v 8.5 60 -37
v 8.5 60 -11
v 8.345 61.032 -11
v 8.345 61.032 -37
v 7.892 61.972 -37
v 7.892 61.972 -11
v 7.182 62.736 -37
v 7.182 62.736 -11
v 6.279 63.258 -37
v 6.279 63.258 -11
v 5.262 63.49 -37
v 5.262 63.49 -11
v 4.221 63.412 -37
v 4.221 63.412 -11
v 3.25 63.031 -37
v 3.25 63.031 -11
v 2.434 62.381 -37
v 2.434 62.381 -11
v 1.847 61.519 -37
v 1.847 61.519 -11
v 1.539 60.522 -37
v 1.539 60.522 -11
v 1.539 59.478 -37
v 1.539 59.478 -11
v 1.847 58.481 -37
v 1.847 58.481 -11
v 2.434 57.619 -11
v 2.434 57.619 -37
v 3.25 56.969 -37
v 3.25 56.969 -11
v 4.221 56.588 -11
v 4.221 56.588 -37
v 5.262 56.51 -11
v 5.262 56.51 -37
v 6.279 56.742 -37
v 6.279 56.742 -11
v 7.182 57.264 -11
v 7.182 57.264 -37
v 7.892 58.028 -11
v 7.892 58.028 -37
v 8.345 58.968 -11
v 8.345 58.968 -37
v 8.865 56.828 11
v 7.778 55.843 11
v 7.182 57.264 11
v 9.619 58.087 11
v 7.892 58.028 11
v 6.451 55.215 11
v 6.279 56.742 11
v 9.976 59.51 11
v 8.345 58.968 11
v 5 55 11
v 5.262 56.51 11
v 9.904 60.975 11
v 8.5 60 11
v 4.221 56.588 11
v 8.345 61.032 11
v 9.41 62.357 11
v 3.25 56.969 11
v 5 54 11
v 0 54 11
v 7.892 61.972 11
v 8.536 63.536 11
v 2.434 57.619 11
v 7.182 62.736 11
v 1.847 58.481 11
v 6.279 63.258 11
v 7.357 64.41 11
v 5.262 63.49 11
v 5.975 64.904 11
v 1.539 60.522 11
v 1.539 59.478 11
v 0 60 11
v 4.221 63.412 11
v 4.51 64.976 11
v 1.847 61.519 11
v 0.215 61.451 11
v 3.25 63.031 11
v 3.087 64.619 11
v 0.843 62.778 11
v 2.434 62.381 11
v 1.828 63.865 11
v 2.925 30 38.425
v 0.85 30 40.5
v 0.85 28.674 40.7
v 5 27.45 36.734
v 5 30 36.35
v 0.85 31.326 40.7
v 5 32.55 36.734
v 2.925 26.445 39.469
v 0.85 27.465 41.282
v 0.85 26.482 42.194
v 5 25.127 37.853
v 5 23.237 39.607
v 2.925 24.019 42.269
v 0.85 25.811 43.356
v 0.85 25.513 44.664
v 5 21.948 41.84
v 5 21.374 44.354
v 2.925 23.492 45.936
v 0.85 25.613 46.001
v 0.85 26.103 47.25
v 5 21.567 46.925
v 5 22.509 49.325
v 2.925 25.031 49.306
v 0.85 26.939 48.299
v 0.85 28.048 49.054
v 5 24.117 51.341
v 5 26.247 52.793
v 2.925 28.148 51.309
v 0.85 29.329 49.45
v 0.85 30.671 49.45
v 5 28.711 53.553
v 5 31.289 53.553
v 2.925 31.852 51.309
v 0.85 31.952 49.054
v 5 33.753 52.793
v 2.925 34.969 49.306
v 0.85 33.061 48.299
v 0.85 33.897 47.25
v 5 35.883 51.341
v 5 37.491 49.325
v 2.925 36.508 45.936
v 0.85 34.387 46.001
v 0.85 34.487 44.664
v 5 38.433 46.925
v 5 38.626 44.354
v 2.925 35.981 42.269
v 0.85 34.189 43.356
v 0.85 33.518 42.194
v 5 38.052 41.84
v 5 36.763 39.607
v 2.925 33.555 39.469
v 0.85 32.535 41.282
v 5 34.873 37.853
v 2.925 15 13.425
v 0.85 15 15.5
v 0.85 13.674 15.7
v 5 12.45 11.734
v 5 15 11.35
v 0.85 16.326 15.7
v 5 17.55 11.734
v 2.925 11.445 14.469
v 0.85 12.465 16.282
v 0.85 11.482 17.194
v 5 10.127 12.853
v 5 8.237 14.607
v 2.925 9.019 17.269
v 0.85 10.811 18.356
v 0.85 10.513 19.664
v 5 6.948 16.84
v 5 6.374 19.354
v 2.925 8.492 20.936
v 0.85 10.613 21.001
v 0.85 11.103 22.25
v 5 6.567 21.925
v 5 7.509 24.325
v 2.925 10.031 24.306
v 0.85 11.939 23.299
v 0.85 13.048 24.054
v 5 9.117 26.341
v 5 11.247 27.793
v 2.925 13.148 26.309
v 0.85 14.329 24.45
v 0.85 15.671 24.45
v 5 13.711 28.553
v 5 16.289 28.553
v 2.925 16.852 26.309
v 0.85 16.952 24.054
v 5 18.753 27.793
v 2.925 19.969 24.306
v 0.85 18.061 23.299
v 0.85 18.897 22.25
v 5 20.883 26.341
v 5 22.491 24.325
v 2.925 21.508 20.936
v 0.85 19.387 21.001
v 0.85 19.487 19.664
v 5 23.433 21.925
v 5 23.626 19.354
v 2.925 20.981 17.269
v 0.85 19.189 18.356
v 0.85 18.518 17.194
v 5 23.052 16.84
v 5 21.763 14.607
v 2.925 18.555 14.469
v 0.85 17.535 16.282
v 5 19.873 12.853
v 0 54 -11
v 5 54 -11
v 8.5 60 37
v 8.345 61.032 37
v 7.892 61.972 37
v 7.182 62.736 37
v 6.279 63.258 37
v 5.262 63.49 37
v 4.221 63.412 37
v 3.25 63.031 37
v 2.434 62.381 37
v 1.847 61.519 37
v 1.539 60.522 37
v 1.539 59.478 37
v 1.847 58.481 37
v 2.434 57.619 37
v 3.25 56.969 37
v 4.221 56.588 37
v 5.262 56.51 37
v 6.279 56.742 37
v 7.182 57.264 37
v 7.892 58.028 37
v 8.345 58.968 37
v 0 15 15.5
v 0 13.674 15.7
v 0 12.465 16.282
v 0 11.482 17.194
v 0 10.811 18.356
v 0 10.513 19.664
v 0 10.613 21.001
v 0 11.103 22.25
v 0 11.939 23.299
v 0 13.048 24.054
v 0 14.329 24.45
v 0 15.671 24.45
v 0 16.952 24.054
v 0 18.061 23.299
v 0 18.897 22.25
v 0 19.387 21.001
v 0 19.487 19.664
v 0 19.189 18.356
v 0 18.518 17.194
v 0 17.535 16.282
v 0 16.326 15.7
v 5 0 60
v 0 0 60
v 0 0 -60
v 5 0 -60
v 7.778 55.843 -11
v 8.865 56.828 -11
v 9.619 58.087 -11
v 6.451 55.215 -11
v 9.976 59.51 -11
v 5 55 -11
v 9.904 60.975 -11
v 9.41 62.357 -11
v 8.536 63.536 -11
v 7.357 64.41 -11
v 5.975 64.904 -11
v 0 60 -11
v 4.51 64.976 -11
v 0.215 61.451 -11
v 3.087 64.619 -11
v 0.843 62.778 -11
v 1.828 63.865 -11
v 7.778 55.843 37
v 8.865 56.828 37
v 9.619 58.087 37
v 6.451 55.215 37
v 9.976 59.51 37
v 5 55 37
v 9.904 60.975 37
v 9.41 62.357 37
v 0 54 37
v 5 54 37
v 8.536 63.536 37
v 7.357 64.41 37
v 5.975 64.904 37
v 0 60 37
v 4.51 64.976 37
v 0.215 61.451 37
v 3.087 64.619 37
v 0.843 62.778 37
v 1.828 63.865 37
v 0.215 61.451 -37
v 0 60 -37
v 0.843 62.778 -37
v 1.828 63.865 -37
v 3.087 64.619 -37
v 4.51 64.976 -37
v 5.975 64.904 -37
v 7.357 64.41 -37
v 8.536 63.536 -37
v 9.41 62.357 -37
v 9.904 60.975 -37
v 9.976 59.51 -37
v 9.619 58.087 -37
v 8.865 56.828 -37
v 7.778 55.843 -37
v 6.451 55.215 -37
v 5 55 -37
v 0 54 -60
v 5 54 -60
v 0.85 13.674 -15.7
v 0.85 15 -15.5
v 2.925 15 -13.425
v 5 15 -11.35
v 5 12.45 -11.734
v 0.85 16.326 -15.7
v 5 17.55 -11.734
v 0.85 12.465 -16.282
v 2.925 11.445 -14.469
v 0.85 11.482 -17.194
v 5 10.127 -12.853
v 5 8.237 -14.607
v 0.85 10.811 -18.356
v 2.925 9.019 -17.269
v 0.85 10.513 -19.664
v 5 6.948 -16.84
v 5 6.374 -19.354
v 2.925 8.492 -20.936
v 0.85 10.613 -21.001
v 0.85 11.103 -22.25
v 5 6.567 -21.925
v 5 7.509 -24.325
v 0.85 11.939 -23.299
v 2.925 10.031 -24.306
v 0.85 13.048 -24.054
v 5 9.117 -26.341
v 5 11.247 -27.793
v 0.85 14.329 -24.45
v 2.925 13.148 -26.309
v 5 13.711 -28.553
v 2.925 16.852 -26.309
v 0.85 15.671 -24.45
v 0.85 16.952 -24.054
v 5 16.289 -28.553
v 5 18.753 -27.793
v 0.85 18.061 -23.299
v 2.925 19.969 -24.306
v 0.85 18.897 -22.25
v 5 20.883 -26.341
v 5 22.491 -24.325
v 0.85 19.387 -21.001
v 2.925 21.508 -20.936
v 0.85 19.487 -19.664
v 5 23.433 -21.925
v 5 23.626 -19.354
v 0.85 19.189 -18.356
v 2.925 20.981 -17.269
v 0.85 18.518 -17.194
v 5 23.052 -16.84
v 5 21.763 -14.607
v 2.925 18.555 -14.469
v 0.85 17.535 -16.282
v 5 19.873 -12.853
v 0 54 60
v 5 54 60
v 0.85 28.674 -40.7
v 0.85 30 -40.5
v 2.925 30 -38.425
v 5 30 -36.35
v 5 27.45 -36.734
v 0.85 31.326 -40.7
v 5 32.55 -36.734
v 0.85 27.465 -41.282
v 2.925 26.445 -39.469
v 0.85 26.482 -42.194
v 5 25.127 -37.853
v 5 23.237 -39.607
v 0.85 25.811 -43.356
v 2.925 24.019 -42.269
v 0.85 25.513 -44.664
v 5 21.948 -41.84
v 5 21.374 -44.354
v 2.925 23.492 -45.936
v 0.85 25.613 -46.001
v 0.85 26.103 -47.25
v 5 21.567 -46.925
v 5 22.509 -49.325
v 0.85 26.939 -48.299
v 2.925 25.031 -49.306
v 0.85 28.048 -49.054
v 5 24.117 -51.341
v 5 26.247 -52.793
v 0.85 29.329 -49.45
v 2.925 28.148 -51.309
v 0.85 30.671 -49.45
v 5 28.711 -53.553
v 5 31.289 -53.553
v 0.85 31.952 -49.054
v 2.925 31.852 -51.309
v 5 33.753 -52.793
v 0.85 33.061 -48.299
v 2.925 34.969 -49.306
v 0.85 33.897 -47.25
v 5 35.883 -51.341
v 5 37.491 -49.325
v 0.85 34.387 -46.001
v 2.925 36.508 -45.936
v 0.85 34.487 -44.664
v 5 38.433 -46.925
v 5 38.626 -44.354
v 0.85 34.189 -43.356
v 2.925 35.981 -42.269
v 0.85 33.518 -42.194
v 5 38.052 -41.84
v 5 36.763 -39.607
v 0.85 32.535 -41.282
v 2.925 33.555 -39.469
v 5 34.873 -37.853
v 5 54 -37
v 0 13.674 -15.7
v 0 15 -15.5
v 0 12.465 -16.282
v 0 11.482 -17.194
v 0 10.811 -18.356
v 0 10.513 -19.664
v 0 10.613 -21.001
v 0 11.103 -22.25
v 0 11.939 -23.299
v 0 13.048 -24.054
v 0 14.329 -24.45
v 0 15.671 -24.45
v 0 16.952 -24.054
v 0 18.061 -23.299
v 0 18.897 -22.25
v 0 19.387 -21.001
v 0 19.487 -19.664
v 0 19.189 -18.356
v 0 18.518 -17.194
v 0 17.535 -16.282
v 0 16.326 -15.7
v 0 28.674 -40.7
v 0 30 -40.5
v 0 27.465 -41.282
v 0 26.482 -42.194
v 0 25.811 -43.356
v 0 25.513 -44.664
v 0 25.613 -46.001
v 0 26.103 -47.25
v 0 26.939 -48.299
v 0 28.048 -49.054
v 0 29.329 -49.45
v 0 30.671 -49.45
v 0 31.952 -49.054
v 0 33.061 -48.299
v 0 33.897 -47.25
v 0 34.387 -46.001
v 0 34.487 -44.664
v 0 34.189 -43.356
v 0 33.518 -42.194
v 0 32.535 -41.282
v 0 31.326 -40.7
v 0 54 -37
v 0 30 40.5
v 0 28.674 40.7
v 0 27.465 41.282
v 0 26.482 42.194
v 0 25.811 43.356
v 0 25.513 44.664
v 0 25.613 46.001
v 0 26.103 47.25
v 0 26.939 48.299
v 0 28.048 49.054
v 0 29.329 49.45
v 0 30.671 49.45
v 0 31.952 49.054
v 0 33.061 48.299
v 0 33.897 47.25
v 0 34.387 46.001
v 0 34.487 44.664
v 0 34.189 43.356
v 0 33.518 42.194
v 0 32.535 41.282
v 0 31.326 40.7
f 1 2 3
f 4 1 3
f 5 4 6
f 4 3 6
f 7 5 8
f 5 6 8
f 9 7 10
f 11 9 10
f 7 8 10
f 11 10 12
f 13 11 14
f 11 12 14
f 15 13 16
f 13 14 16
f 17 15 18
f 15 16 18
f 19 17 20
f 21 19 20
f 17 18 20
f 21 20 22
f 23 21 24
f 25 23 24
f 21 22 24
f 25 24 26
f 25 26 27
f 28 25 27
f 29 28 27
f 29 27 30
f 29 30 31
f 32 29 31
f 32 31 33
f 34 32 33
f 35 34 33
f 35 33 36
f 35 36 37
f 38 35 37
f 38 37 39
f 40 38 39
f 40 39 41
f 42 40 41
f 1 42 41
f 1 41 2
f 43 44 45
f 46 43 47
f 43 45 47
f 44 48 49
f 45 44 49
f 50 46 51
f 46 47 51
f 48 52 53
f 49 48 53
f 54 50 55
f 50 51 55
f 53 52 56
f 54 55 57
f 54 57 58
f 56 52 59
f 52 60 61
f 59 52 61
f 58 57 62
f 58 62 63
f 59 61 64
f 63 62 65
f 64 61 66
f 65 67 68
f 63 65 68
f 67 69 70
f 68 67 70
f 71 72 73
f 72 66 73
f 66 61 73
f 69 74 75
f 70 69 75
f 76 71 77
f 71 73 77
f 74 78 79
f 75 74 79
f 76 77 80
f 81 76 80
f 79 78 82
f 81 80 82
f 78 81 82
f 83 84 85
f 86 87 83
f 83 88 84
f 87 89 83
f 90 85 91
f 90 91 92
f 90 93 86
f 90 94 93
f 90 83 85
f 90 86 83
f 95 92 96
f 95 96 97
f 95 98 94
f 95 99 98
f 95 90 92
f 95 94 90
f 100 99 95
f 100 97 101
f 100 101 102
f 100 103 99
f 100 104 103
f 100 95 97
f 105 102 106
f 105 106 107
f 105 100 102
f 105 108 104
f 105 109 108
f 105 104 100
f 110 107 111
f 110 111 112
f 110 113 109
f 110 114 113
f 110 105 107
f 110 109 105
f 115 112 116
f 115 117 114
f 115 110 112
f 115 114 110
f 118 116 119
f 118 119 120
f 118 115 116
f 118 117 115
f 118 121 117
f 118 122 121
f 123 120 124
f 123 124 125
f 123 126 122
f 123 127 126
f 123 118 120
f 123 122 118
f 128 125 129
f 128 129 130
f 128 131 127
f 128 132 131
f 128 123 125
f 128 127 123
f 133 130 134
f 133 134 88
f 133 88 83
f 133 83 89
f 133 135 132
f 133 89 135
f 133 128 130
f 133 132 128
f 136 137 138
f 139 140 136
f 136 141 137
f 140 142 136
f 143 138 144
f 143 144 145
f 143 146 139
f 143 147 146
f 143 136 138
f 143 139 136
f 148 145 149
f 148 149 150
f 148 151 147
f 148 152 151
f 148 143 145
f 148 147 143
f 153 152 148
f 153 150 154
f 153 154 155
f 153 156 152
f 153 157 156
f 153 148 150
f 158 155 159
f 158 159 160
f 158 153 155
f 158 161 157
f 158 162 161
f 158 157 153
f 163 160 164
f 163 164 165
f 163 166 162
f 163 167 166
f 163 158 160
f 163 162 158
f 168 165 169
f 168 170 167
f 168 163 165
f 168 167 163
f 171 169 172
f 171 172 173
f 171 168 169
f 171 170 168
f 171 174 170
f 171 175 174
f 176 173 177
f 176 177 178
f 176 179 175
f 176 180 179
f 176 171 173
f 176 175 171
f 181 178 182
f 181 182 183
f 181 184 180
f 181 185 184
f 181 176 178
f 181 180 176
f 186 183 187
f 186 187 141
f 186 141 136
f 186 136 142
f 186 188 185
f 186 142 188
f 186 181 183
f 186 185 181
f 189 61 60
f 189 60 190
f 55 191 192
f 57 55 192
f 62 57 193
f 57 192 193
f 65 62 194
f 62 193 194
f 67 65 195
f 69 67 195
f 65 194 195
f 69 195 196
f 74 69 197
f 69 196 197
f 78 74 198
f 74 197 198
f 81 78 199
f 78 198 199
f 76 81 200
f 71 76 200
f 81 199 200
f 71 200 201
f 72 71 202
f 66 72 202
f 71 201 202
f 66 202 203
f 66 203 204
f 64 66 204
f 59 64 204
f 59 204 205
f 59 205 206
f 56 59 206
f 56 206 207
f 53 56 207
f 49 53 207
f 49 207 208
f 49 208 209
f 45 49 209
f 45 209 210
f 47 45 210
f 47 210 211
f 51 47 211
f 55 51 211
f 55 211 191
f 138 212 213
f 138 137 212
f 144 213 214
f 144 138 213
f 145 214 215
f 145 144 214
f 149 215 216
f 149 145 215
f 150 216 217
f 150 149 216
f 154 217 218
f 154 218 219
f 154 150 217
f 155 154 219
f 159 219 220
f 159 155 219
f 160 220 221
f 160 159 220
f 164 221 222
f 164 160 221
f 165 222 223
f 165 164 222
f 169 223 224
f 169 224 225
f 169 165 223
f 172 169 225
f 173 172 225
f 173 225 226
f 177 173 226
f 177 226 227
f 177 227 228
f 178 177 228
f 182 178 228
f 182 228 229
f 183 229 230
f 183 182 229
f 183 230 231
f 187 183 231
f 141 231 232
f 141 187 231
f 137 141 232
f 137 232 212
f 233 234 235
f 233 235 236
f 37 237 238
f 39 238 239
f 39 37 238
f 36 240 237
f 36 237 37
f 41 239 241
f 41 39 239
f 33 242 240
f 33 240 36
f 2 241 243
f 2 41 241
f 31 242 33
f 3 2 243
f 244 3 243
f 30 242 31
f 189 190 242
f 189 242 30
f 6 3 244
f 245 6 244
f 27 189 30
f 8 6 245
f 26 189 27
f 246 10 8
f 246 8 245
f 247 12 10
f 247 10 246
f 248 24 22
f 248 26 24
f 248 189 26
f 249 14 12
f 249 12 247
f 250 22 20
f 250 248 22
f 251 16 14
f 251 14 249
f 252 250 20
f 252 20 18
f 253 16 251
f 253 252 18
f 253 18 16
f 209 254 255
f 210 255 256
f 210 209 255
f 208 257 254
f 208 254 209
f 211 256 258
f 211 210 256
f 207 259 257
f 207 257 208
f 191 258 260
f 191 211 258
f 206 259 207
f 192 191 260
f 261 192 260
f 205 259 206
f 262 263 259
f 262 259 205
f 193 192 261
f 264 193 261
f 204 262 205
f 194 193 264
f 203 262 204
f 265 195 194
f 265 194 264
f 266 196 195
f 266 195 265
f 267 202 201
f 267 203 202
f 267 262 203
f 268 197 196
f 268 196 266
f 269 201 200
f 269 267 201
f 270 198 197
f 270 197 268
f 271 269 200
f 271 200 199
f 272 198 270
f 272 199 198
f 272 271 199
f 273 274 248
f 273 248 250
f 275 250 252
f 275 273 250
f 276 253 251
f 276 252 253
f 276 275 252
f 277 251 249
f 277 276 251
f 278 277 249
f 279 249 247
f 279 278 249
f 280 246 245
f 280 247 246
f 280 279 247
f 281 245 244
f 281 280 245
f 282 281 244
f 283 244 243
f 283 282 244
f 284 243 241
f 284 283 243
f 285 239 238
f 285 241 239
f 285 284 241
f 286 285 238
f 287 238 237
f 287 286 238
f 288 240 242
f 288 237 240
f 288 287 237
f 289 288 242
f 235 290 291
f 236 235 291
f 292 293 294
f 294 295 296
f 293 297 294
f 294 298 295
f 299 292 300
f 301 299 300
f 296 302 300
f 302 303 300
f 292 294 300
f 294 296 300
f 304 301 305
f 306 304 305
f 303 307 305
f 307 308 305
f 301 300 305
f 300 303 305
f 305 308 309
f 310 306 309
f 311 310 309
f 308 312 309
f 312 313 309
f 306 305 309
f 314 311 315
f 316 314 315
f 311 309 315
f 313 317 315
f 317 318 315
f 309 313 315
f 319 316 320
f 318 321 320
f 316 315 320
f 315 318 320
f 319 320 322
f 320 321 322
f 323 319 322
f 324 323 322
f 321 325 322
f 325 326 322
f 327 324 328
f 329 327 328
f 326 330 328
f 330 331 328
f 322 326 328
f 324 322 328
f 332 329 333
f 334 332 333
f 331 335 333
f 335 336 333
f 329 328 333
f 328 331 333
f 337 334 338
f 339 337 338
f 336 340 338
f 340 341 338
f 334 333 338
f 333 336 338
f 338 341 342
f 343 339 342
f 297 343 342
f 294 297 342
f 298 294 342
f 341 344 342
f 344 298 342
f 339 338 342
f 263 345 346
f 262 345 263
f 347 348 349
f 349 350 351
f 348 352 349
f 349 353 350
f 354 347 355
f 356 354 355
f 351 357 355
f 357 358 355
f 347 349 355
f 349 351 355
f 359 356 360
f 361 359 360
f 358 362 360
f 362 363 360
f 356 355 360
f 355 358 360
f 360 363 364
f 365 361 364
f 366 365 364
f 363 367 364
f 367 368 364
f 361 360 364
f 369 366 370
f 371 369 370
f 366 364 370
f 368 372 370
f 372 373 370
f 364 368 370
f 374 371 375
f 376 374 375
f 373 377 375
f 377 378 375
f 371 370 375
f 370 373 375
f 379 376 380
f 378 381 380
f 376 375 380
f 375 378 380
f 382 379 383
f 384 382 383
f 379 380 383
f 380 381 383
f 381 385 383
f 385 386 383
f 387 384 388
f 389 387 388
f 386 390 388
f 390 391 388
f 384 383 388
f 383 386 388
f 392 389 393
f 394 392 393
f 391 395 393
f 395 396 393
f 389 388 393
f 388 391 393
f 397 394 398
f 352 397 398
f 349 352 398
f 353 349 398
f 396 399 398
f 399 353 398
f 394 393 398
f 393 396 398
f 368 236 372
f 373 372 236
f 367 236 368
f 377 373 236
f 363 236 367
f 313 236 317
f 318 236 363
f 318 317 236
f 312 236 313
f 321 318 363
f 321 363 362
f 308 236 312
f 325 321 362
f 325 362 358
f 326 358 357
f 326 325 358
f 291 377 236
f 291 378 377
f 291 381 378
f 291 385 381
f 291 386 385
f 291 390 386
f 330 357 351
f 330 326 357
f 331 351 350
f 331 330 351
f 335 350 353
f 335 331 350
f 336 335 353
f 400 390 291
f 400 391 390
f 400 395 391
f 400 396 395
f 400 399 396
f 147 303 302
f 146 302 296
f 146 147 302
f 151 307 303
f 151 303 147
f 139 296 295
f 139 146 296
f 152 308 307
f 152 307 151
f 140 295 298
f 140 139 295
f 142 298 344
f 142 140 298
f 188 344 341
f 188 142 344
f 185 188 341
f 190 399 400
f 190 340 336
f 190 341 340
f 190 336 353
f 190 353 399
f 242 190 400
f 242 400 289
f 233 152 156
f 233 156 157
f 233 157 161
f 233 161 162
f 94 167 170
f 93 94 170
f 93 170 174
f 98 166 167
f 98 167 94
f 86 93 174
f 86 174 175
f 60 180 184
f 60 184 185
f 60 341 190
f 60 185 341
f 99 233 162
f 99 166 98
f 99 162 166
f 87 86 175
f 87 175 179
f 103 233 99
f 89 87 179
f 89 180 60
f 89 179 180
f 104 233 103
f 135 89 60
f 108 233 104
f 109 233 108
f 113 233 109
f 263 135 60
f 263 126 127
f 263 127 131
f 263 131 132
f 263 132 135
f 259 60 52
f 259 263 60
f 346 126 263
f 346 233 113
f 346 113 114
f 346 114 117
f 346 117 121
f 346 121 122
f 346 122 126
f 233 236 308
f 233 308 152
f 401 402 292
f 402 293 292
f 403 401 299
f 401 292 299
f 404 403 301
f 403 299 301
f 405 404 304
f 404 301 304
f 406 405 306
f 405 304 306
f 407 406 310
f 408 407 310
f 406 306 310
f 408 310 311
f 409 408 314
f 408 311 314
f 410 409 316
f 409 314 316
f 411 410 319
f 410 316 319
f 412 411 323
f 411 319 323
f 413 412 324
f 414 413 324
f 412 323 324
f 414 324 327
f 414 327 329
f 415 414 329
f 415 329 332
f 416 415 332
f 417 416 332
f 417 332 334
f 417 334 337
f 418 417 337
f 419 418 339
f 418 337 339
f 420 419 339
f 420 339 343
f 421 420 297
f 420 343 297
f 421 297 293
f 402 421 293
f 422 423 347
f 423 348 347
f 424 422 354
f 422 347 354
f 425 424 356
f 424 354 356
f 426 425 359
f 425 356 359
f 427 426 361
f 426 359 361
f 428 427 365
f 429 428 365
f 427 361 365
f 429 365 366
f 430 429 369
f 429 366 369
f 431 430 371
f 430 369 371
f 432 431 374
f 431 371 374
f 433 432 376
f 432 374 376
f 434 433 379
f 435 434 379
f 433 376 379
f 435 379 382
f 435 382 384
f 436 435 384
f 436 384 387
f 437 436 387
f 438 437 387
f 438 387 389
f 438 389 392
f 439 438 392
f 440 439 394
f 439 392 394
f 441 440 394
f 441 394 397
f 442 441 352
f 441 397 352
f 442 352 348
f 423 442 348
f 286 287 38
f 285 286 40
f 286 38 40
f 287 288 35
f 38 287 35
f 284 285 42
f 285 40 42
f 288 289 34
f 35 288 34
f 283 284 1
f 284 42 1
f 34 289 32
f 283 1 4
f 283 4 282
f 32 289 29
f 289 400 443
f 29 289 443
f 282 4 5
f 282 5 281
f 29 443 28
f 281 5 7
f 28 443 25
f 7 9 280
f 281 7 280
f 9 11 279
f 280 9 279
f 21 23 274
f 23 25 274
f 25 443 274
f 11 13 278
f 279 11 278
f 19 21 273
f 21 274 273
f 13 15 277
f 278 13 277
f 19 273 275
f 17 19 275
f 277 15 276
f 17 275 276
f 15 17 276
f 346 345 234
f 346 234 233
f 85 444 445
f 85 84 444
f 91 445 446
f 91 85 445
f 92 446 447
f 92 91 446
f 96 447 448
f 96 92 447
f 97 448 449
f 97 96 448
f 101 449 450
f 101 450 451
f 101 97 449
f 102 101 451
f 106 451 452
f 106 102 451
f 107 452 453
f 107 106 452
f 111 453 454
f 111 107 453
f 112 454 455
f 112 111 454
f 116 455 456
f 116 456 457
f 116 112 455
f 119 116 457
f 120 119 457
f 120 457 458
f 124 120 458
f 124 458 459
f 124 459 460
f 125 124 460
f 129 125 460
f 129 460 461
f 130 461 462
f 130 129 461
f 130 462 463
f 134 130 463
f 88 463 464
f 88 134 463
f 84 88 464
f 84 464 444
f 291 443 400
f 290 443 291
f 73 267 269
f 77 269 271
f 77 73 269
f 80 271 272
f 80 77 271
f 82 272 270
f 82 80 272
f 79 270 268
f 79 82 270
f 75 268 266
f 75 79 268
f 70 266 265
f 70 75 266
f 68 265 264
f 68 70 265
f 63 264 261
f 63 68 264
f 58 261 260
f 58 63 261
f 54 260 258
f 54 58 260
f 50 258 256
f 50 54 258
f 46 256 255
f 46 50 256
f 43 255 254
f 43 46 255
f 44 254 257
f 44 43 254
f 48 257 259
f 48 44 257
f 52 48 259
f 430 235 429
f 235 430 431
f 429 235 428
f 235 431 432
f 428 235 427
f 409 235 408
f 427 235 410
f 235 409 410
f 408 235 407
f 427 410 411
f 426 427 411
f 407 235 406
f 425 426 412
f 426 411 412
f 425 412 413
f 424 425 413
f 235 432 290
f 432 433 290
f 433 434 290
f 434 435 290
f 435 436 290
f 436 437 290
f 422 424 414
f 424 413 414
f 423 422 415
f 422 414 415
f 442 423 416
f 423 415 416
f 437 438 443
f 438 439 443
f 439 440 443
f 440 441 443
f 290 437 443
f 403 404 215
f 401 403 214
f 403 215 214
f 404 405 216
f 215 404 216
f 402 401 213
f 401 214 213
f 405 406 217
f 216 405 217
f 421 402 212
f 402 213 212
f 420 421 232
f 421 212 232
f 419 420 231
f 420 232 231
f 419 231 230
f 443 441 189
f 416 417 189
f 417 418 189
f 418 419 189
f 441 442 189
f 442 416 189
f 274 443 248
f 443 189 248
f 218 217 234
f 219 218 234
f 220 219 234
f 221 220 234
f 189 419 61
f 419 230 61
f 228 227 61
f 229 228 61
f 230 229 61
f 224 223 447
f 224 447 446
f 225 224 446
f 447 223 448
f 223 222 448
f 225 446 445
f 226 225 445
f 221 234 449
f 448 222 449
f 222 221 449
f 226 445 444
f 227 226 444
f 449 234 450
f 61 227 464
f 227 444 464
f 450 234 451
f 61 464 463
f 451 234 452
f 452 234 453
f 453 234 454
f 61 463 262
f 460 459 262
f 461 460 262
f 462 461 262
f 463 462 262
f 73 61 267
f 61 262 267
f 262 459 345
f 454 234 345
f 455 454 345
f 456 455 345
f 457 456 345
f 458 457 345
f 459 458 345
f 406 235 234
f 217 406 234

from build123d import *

# Parameters (mm, degrees)
SKETCH_1_W                 = 5
SKETCH_1_H                 = 60
EXTRUDE_1_DEPTH            = 60
SKETCH_2_R                 = 5
SKETCH_4_R                 = 3.5
CUT_EXTRUDE_1_DEPTH        = 137.839321834
HOLE_WIZARD_M81_AT_2_COUNT = 2
HOLE_WIZARD_M81_AT_2_PITCH = 29.154759474
CUT_EXTRUDE_2_DEPTH        = 89.600225733
CUT_EXTRUDE_2_DEPTH_BACK   = 89.600225733
SKETCH_7_W                 = 23
SKETCH_7_H                 = 11
SKETCH_7_W_2               = 22


with BuildPart() as part:
    # Эскиз1 → Вытянуть-Тонкостенный1 (new, symmetric)
    with BuildSketch(Plane.XY):
        with Locations((2.5, 30)):
            Rectangle(SKETCH_1_W, SKETCH_1_H)
    extrude(amount=EXTRUDE_1_DEPTH, both=True)

    # По траектории1: sweep along a curve in space
    with BuildLine() as sweep_1_path:
        Line((5, 60, 60), (5, 60, -60))
    # Эскиз2 → По траектории1 (sweep)
    with BuildSketch(Plane.XY.offset(60)):
        with Locations((5, 60)):
            Circle(SKETCH_2_R)
    sweep(path=sweep_1_path.line)

    # Эскиз4 → Вырез-Вытянуть1 (cut, through all)
    with BuildSketch(Plane.XY.offset(60)):
        with Locations((5, 60)):
            Circle(SKETCH_4_R)
    extrude(amount=-CUT_EXTRUDE_1_DEPTH, mode=Mode.SUBTRACT)

    # Эскиз5 → Зенковка для  винта с плоской головкой M81 (revolve, cut)
    with BuildSketch(Plane(origin=(5, 30, 45), x_dir=(0, 0, -1), z_dir=(0, 1, 0))):
        Polygon((0, 0), (0, 5), (4.5, 5), (4.5, 4.15), (8.65, 0), align=None)
    hole_wizard_m81 = revolve(axis=Axis((11.35, 30, 45), (-1, 0, 0)), mode=Mode.SUBTRACT)

    # Зенковка для  винта с плоской головкой M81 at 2: Зенковка для  винта с плоской головкой M81 ×2
    with Locations(*[Vector(0, -0.5144957554275265, -0.8574929257125442) * (i * HOLE_WIZARD_M81_AT_2_PITCH) for i in range(1, HOLE_WIZARD_M81_AT_2_COUNT)]):
        add(hole_wizard_m81, mode=Mode.SUBTRACT)

    # Зеркальное отражение1: Зенковка для  винта с плоской головкой M81 across plane
    add(hole_wizard_m81.mirror(Plane.XY), mode=Mode.SUBTRACT)

    # Зеркальное отражение1 copy 1 sketch → Зеркальное отражение1 copy 1 (revolve, cut)
    with BuildSketch(Plane(origin=(5, 15, -20), x_dir=(0, 0, 1), z_dir=(0, 1, 0))):
        Polygon((0, 0), (0, -5), (4.5, -5), (4.5, -4.15), (8.65, 0), align=None)
    revolve(axis=Axis((11.35, 15, -20), (1, 0, 0)), mode=Mode.SUBTRACT)

    # Эскиз7 → Вырез-Вытянуть2 (cut, two sides: drawn at the far end of the back side and taken through both)
    with BuildSketch(Plane(origin=(5, 0, 0), x_dir=(0, 0, -1), z_dir=(1, 0, 0)).offset(-CUT_EXTRUDE_2_DEPTH_BACK)):
        with Locations((48.5, 59.5)):
            Rectangle(SKETCH_7_W, SKETCH_7_H)
        with Locations((-48.5, 59.5)):
            Rectangle(SKETCH_7_W, SKETCH_7_H)
        with Locations((0, 59.5)):
            Rectangle(SKETCH_7_W_2, SKETCH_7_H)
    extrude(amount=CUT_EXTRUDE_2_DEPTH + CUT_EXTRUDE_2_DEPTH_BACK, mode=Mode.SUBTRACT)


solid = part.part
